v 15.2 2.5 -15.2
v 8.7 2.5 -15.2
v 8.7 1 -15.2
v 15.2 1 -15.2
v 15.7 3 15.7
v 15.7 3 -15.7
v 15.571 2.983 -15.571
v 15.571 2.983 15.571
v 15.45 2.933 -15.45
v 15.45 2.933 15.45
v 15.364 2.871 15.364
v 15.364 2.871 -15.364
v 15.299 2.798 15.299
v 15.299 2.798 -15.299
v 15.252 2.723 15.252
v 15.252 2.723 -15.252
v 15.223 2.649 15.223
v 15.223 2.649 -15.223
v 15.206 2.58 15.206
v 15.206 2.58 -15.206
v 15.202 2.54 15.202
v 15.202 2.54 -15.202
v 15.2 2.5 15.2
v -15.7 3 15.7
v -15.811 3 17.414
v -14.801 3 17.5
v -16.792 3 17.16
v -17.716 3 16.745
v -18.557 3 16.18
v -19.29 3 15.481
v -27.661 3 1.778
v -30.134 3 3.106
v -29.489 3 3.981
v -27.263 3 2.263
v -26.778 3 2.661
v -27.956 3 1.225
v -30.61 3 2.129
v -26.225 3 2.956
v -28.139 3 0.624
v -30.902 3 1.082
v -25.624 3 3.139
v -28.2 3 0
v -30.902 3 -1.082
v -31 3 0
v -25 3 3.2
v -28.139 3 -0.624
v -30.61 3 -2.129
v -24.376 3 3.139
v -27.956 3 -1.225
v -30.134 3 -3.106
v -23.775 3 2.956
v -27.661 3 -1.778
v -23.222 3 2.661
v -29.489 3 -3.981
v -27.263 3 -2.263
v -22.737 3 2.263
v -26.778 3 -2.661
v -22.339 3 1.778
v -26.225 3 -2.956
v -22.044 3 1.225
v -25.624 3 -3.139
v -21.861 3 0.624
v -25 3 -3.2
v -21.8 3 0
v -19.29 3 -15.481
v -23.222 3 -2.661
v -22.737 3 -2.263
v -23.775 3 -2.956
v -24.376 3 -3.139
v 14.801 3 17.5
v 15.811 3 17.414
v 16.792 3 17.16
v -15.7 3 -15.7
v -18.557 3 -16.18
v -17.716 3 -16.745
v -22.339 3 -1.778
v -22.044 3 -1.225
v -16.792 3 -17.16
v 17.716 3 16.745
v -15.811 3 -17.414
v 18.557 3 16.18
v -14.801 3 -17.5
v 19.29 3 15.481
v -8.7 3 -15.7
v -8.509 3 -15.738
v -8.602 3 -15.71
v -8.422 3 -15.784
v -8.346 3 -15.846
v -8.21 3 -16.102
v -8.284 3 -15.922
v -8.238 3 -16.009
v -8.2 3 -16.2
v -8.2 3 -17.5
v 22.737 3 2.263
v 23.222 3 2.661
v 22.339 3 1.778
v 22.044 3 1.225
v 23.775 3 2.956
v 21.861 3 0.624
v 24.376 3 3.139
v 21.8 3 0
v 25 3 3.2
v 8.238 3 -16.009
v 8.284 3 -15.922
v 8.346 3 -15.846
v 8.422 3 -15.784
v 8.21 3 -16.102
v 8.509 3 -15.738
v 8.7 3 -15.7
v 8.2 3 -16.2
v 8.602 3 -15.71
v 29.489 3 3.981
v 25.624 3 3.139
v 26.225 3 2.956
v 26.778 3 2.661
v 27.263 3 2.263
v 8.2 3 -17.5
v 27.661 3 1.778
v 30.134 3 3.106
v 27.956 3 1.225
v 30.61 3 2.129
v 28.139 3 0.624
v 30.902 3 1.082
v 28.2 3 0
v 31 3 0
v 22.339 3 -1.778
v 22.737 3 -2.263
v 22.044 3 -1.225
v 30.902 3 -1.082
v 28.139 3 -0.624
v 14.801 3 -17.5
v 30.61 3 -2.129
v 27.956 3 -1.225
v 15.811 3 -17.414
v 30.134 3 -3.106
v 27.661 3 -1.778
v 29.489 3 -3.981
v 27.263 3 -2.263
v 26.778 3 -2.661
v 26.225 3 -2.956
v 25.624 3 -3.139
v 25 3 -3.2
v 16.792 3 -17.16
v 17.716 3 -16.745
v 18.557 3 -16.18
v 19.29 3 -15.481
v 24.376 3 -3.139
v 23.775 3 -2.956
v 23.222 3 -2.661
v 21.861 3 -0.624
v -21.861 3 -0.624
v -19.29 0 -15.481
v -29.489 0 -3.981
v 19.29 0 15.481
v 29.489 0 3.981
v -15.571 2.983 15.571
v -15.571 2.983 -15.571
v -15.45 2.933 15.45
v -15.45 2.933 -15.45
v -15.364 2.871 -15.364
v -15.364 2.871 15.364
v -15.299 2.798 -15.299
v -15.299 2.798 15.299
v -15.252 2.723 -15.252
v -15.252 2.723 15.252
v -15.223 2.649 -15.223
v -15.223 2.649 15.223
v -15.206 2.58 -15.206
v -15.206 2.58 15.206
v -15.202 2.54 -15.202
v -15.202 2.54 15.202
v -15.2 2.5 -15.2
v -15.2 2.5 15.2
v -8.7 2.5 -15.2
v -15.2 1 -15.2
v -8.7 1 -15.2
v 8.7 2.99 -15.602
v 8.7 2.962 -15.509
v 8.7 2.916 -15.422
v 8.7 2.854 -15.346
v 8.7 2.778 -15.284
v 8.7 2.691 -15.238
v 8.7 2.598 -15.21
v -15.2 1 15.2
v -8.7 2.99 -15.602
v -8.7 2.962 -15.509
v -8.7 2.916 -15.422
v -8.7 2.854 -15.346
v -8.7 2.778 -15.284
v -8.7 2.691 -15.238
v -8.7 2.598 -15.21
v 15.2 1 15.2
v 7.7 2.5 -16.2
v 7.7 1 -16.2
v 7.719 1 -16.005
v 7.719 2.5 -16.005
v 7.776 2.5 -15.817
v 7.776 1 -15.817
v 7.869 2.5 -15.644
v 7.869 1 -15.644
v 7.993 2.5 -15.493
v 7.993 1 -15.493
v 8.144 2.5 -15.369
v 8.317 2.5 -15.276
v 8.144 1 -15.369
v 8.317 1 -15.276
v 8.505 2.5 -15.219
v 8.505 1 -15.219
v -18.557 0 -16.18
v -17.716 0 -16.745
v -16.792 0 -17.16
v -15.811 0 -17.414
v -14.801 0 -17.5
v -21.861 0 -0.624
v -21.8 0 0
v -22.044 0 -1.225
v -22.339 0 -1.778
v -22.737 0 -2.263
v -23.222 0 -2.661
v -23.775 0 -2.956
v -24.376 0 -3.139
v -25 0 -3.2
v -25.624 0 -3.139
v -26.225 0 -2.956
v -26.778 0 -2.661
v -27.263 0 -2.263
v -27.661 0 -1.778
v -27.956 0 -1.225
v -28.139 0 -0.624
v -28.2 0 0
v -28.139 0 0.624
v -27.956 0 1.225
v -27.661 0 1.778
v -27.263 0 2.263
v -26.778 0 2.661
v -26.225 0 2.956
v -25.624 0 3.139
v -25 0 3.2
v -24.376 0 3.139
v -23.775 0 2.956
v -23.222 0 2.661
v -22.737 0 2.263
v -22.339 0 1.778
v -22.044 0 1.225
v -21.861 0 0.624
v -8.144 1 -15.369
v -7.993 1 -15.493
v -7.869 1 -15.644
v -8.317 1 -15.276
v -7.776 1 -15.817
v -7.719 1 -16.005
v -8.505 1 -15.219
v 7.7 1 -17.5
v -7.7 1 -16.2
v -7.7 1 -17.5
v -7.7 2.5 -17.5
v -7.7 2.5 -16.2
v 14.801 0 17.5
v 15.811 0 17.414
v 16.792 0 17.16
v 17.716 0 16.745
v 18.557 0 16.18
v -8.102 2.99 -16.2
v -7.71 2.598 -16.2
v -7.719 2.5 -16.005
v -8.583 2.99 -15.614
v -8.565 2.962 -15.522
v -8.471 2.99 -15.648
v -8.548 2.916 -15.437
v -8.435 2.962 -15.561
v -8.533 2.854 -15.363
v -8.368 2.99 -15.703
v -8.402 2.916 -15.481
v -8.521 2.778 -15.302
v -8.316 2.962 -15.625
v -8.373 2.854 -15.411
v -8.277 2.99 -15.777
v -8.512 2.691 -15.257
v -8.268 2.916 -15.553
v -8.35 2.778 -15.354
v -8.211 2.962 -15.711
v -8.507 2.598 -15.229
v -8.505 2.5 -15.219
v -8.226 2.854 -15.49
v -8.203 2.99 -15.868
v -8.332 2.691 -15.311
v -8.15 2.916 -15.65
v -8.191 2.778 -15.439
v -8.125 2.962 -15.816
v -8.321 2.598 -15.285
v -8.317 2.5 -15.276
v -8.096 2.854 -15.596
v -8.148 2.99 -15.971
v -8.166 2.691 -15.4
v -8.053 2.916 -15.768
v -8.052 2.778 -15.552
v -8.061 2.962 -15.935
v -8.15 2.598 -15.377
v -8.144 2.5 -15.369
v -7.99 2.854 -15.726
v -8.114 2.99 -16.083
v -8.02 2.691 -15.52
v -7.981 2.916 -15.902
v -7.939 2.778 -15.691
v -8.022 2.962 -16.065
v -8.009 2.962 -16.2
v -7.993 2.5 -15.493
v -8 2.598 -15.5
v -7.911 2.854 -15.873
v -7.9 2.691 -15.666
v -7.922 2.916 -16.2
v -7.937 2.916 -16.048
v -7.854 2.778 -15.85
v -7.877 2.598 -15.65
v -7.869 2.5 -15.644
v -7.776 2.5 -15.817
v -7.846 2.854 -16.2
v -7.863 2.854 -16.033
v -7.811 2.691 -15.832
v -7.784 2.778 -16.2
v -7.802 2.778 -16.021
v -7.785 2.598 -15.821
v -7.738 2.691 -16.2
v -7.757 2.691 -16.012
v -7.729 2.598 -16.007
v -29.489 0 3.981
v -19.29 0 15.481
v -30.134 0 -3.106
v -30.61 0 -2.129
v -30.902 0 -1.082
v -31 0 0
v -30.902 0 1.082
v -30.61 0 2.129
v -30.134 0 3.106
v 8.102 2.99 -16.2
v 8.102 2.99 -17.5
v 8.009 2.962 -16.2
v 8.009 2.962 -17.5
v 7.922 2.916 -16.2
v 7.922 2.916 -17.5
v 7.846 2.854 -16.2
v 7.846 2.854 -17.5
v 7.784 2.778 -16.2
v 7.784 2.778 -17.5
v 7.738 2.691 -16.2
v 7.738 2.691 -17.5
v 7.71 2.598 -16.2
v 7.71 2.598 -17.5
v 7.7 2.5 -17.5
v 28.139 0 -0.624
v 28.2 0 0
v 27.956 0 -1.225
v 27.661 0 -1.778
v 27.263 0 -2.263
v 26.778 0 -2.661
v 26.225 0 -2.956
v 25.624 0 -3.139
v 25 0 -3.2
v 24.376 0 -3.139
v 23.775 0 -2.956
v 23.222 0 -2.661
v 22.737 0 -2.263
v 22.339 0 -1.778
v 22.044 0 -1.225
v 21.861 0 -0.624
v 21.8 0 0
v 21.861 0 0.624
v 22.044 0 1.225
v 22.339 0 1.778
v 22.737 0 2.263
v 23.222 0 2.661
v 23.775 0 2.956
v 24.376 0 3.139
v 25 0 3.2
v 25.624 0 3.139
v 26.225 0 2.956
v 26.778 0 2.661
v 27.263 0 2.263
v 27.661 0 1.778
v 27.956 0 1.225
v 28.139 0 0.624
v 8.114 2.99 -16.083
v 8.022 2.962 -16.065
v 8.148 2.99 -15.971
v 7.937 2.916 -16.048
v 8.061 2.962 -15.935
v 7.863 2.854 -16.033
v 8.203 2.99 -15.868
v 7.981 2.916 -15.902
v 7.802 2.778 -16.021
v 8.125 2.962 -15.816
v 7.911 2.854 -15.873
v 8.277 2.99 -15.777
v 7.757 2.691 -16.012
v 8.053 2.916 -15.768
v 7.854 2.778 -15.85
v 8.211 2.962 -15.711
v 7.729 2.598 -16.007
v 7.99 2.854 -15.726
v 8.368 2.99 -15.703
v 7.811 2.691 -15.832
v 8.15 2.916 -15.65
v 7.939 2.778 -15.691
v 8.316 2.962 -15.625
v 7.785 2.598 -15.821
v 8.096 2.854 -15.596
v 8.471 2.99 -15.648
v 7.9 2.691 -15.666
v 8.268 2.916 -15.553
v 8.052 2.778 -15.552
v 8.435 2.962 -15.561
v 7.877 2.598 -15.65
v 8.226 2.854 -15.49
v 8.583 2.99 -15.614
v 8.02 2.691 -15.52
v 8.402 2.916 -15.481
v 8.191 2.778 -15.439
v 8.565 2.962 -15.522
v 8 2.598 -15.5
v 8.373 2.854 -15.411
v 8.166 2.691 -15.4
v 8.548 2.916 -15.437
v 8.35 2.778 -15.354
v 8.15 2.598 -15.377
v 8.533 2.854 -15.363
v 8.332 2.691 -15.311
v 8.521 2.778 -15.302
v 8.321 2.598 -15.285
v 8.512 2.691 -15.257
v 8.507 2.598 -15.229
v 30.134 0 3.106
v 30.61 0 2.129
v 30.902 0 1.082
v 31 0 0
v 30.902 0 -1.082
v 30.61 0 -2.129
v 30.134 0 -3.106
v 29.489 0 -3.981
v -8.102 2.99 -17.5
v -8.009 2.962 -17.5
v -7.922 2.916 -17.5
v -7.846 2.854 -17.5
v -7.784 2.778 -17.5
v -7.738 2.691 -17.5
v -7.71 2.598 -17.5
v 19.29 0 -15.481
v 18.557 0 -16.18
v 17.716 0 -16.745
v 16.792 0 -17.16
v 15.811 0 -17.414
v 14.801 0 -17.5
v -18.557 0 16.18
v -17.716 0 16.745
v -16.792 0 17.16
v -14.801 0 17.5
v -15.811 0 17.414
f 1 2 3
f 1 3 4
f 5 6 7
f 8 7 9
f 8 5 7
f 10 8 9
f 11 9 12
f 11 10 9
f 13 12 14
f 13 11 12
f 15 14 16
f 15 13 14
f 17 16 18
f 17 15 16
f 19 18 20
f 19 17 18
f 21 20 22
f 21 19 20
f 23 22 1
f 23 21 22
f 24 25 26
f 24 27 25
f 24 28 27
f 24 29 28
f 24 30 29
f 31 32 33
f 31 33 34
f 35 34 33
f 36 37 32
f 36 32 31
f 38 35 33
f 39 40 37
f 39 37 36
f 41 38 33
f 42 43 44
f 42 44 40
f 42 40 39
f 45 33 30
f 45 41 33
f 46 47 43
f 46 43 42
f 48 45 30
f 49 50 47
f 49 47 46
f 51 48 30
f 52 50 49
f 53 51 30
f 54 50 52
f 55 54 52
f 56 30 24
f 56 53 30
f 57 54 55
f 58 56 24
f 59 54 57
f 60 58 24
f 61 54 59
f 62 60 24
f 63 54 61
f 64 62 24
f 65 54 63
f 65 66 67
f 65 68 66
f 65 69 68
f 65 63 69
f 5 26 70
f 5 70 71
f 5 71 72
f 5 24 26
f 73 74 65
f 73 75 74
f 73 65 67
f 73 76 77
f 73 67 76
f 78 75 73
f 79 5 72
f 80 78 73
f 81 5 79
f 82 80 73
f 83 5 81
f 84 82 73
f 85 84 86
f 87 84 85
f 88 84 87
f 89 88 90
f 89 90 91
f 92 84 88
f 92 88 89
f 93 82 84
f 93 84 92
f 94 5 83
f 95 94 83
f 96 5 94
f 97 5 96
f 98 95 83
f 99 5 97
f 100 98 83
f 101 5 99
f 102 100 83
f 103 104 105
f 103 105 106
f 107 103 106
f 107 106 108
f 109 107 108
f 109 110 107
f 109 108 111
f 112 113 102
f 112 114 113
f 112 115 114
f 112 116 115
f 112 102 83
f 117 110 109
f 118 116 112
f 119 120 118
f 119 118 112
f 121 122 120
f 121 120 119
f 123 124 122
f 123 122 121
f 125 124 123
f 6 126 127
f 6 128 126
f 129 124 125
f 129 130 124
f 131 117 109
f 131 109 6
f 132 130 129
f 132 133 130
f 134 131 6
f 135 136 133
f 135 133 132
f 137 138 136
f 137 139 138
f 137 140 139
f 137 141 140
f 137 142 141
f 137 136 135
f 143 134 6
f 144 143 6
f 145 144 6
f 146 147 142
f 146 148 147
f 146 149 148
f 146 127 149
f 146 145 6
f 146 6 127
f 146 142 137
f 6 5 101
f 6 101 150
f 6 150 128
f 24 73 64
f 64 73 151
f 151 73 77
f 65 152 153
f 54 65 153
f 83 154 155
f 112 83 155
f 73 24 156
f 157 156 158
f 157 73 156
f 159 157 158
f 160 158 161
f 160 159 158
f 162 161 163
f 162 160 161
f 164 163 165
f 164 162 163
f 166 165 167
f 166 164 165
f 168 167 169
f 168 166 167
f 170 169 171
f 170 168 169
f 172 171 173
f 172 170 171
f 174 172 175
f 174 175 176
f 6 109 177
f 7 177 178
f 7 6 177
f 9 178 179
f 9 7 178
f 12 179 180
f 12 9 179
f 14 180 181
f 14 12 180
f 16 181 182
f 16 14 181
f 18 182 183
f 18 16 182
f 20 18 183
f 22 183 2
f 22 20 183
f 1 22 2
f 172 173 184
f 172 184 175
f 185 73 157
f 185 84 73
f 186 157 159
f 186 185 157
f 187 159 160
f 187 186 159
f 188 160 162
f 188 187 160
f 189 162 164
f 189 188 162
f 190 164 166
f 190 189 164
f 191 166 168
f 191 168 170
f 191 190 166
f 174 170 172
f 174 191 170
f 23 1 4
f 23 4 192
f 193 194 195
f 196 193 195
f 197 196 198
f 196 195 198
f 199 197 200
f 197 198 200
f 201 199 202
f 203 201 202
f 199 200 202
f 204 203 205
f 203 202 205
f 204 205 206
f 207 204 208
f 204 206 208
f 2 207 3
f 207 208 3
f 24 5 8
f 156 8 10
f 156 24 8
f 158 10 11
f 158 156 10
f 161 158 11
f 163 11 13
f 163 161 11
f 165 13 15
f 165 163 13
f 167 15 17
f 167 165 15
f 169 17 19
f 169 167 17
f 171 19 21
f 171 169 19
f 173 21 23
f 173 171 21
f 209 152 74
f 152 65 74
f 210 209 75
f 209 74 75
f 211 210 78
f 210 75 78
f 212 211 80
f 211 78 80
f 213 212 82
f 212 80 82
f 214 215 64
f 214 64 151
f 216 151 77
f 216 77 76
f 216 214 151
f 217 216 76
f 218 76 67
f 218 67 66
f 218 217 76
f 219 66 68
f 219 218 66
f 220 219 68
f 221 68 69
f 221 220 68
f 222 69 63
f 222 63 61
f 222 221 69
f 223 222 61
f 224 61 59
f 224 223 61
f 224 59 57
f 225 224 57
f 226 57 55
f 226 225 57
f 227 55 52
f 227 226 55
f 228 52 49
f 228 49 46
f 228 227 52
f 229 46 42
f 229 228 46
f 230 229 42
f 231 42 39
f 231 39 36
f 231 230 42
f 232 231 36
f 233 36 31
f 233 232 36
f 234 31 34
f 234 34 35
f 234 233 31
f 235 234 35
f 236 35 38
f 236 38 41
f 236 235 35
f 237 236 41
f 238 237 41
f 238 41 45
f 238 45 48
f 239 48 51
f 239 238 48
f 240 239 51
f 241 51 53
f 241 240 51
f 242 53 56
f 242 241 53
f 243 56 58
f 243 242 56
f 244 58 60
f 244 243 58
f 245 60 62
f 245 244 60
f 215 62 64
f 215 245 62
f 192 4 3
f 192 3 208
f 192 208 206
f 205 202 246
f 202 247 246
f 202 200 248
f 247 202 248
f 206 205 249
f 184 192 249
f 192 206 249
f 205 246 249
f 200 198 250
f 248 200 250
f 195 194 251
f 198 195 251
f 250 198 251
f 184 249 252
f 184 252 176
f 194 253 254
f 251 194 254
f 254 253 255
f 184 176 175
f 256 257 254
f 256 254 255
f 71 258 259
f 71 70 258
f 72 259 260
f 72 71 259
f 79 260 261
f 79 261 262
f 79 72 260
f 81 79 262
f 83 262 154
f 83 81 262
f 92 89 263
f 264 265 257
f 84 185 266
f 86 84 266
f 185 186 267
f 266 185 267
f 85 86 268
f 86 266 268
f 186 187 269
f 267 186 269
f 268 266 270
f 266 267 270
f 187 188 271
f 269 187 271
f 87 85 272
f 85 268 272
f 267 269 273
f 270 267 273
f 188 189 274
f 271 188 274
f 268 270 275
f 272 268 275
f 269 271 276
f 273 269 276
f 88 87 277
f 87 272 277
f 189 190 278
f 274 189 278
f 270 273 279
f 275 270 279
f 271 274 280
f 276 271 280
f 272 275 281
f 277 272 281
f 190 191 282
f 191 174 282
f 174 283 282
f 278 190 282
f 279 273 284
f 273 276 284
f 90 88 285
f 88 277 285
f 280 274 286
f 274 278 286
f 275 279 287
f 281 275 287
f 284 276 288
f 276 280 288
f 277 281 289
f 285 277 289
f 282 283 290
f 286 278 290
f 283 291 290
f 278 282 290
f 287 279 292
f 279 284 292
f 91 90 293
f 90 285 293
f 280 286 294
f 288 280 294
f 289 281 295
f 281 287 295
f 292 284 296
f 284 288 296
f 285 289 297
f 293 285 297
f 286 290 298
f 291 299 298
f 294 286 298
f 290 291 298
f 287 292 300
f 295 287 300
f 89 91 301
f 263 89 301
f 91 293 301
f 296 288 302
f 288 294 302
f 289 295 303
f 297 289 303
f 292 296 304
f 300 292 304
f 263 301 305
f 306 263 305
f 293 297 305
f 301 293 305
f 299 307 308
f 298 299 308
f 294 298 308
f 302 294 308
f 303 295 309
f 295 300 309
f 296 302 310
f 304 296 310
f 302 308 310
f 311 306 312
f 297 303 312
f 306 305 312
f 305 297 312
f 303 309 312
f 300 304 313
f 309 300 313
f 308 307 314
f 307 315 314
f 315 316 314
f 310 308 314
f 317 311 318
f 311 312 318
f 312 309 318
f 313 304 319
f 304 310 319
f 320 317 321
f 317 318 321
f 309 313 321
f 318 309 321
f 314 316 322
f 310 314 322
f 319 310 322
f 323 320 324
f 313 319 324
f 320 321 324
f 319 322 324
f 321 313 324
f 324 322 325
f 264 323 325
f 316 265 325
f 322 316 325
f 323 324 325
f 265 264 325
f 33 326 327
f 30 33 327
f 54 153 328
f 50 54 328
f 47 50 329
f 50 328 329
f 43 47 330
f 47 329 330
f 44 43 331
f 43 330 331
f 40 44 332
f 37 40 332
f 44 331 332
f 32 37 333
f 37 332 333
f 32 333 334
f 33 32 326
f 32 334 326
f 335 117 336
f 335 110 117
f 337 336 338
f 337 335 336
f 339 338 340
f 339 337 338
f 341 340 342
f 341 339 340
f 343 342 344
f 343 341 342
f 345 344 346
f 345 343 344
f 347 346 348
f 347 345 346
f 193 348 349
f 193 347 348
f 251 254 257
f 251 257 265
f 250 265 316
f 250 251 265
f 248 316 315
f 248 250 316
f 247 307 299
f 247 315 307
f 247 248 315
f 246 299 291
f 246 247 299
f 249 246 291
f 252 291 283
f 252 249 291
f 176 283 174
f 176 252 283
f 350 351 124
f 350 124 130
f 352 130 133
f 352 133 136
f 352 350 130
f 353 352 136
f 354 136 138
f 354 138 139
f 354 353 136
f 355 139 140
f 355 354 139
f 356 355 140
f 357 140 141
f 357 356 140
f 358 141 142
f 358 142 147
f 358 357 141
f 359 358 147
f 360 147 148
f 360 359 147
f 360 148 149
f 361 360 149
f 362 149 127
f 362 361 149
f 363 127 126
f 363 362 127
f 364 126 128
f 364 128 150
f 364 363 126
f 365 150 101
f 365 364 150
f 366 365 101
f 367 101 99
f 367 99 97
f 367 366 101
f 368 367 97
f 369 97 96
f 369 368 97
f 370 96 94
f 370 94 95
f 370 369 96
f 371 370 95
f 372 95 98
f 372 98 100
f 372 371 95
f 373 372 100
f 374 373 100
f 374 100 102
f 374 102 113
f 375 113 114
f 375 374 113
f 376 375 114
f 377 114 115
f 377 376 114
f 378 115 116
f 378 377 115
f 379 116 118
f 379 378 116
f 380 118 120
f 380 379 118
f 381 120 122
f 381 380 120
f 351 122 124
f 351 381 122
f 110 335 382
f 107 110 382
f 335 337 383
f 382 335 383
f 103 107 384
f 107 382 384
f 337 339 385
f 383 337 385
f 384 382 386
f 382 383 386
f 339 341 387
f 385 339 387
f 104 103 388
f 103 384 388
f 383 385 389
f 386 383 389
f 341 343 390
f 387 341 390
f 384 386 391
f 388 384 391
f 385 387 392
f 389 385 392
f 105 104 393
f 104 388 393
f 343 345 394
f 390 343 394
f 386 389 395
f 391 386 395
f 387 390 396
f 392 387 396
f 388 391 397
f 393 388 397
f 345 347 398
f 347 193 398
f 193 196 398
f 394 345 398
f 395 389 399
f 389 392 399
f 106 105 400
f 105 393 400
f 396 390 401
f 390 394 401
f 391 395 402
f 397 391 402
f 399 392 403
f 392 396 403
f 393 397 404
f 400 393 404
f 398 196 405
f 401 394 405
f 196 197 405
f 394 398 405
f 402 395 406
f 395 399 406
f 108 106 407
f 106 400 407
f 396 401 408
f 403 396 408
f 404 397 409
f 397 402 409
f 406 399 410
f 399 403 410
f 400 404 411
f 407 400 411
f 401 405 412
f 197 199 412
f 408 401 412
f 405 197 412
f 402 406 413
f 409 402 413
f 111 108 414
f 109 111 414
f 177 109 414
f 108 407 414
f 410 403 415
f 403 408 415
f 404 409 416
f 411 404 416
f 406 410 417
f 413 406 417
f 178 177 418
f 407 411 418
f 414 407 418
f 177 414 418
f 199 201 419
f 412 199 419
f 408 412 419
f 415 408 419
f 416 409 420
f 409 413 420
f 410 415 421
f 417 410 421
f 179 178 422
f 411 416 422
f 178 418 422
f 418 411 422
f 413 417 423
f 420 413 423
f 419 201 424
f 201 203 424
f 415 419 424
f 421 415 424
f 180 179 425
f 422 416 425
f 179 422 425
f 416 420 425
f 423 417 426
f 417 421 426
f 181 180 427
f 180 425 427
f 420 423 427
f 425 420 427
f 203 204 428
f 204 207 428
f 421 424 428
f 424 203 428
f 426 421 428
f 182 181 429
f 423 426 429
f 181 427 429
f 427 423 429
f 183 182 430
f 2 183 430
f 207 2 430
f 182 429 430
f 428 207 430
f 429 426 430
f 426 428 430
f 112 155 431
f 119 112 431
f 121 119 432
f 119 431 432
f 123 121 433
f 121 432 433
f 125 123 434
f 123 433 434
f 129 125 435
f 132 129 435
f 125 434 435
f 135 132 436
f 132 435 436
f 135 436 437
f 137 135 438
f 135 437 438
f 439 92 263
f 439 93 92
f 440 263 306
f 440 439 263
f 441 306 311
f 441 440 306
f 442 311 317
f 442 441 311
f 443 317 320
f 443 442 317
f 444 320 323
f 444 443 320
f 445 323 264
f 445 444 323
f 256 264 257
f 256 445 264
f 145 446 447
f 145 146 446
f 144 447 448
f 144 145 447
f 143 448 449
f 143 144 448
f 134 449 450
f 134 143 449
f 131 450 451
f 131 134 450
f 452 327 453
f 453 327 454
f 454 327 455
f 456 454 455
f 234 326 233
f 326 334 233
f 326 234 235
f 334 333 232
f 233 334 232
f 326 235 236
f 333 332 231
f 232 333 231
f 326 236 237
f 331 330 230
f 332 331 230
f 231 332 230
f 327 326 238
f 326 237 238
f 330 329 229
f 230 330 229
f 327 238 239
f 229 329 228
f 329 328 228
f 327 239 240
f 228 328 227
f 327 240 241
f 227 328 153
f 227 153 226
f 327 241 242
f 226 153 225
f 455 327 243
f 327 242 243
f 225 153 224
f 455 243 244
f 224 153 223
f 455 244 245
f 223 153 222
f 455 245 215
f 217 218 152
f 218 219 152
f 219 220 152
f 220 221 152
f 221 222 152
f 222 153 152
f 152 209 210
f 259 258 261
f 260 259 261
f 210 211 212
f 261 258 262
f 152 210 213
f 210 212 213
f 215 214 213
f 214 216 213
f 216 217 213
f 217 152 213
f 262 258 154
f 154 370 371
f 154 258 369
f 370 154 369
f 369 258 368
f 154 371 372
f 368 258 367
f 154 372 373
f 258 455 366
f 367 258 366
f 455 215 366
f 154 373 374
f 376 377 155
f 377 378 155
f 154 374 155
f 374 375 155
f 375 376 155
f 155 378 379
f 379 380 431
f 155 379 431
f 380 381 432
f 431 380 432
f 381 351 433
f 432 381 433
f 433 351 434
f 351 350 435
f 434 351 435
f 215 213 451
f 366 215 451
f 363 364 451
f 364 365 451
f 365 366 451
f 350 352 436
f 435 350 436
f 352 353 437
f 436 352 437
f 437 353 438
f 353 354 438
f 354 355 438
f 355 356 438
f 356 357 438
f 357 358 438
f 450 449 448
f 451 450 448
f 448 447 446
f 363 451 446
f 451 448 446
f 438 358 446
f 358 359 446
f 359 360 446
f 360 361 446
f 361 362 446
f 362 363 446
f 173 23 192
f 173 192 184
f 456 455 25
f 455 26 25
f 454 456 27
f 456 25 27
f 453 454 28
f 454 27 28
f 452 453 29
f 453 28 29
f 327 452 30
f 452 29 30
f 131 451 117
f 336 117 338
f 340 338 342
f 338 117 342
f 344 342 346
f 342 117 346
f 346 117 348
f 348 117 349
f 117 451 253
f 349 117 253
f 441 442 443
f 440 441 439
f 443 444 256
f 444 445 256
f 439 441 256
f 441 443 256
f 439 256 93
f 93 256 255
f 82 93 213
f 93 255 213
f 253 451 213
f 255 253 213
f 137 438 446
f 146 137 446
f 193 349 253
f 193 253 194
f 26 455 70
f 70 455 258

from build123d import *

# Parameters (mm, degrees)
SKETCH1_R           = 3.2
BOSS_EXTRUDE1_DEPTH = 3
CUT_EXTRUDE1_DEPTH  = 2
FILLET1_R           = 6
FILLET2_R           = 1
FILLET3_R           = 0.5


with BuildPart() as part:
    # Sketch1 → Boss-Extrude1 (new body)
    with BuildSketch(Plane(origin=(0, 0, 0), x_dir=(1, 0, 0), z_dir=(0, 1, 0))):
        with BuildLine():
            Line((-17.5, -17.5), (17.5, -17.5))
            Line((17.5, -17.5), (29.489041807, -3.981017917))
            ThreePointArc((29.489041807, -3.981017917), (31, 0), (29.489041807, 3.981017917))
            Line((29.489041807, 3.981017917), (17.5, 17.5))
            Line((17.5, 17.5), (-17.5, 17.5))
            Line((-17.5, 17.5), (-29.489041807, 3.981017917))
            ThreePointArc((-29.489041807, 3.981017917), (-31, 0), (-29.489041807, -3.981017917))
            Line((-29.489041807, -3.981017917), (-17.5, -17.5))
        make_face()
        with Locations((-25, 0)):
            Circle(SKETCH1_R, mode=Mode.SUBTRACT)
        with Locations((25, 0)):
            Circle(SKETCH1_R, mode=Mode.SUBTRACT)
    extrude(amount=BOSS_EXTRUDE1_DEPTH)

    # Sketch2 → Cut-Extrude1 (cut)
    with BuildSketch(Plane(origin=(0, 3, 0), x_dir=(1, 0, 0), z_dir=(0, 1, 0))):
        Polygon((-15.2, 15.2), (-7.7, 15.2), (-7.7, 17.5), (7.7, 17.5), (7.7, 15.2), (15.2, 15.2), (15.2, -15.2), (-15.2, -15.2), align=None)
    extrude(amount=-CUT_EXTRUDE1_DEPTH, mode=Mode.SUBTRACT)

    # Fillet1
    fillet1_edges = [part.edges().sort_by_distance(p)[0] for p in [
        (17.5, 1.5, 17.5),
        (-17.5, 1.5, 17.5),
        (-17.5, 1.5, -17.5),
        (17.5, 1.5, -17.5),
    ]]
    fillet(fillet1_edges, radius=FILLET1_R)

    # Fillet2
    fillet2_edges = [part.edges().sort_by_distance(p)[0] for p in [
        (-7.7, 2, -15.2),
        (7.7, 2, -15.2),
    ]]
    fillet(fillet2_edges, radius=FILLET2_R)

    # Fillet3
    fillet3_edges = [part.edges().sort_by_distance(p)[0] for p in [
        (-11.95, 3, -15.2),
        (-7.992893219, 3, -15.492893219),
        (7.992893219, 3, -15.492893219),
        (15.2, 3, 0),
        (11.95, 3, -15.2),
        (-7.7, 3, -16.85),
        (-15.2, 3, 0),
        (0, 3, 15.2),
        (7.7, 3, -16.85),
    ]]
    fillet(fillet3_edges, radius=FILLET3_R)


solid = part.part
